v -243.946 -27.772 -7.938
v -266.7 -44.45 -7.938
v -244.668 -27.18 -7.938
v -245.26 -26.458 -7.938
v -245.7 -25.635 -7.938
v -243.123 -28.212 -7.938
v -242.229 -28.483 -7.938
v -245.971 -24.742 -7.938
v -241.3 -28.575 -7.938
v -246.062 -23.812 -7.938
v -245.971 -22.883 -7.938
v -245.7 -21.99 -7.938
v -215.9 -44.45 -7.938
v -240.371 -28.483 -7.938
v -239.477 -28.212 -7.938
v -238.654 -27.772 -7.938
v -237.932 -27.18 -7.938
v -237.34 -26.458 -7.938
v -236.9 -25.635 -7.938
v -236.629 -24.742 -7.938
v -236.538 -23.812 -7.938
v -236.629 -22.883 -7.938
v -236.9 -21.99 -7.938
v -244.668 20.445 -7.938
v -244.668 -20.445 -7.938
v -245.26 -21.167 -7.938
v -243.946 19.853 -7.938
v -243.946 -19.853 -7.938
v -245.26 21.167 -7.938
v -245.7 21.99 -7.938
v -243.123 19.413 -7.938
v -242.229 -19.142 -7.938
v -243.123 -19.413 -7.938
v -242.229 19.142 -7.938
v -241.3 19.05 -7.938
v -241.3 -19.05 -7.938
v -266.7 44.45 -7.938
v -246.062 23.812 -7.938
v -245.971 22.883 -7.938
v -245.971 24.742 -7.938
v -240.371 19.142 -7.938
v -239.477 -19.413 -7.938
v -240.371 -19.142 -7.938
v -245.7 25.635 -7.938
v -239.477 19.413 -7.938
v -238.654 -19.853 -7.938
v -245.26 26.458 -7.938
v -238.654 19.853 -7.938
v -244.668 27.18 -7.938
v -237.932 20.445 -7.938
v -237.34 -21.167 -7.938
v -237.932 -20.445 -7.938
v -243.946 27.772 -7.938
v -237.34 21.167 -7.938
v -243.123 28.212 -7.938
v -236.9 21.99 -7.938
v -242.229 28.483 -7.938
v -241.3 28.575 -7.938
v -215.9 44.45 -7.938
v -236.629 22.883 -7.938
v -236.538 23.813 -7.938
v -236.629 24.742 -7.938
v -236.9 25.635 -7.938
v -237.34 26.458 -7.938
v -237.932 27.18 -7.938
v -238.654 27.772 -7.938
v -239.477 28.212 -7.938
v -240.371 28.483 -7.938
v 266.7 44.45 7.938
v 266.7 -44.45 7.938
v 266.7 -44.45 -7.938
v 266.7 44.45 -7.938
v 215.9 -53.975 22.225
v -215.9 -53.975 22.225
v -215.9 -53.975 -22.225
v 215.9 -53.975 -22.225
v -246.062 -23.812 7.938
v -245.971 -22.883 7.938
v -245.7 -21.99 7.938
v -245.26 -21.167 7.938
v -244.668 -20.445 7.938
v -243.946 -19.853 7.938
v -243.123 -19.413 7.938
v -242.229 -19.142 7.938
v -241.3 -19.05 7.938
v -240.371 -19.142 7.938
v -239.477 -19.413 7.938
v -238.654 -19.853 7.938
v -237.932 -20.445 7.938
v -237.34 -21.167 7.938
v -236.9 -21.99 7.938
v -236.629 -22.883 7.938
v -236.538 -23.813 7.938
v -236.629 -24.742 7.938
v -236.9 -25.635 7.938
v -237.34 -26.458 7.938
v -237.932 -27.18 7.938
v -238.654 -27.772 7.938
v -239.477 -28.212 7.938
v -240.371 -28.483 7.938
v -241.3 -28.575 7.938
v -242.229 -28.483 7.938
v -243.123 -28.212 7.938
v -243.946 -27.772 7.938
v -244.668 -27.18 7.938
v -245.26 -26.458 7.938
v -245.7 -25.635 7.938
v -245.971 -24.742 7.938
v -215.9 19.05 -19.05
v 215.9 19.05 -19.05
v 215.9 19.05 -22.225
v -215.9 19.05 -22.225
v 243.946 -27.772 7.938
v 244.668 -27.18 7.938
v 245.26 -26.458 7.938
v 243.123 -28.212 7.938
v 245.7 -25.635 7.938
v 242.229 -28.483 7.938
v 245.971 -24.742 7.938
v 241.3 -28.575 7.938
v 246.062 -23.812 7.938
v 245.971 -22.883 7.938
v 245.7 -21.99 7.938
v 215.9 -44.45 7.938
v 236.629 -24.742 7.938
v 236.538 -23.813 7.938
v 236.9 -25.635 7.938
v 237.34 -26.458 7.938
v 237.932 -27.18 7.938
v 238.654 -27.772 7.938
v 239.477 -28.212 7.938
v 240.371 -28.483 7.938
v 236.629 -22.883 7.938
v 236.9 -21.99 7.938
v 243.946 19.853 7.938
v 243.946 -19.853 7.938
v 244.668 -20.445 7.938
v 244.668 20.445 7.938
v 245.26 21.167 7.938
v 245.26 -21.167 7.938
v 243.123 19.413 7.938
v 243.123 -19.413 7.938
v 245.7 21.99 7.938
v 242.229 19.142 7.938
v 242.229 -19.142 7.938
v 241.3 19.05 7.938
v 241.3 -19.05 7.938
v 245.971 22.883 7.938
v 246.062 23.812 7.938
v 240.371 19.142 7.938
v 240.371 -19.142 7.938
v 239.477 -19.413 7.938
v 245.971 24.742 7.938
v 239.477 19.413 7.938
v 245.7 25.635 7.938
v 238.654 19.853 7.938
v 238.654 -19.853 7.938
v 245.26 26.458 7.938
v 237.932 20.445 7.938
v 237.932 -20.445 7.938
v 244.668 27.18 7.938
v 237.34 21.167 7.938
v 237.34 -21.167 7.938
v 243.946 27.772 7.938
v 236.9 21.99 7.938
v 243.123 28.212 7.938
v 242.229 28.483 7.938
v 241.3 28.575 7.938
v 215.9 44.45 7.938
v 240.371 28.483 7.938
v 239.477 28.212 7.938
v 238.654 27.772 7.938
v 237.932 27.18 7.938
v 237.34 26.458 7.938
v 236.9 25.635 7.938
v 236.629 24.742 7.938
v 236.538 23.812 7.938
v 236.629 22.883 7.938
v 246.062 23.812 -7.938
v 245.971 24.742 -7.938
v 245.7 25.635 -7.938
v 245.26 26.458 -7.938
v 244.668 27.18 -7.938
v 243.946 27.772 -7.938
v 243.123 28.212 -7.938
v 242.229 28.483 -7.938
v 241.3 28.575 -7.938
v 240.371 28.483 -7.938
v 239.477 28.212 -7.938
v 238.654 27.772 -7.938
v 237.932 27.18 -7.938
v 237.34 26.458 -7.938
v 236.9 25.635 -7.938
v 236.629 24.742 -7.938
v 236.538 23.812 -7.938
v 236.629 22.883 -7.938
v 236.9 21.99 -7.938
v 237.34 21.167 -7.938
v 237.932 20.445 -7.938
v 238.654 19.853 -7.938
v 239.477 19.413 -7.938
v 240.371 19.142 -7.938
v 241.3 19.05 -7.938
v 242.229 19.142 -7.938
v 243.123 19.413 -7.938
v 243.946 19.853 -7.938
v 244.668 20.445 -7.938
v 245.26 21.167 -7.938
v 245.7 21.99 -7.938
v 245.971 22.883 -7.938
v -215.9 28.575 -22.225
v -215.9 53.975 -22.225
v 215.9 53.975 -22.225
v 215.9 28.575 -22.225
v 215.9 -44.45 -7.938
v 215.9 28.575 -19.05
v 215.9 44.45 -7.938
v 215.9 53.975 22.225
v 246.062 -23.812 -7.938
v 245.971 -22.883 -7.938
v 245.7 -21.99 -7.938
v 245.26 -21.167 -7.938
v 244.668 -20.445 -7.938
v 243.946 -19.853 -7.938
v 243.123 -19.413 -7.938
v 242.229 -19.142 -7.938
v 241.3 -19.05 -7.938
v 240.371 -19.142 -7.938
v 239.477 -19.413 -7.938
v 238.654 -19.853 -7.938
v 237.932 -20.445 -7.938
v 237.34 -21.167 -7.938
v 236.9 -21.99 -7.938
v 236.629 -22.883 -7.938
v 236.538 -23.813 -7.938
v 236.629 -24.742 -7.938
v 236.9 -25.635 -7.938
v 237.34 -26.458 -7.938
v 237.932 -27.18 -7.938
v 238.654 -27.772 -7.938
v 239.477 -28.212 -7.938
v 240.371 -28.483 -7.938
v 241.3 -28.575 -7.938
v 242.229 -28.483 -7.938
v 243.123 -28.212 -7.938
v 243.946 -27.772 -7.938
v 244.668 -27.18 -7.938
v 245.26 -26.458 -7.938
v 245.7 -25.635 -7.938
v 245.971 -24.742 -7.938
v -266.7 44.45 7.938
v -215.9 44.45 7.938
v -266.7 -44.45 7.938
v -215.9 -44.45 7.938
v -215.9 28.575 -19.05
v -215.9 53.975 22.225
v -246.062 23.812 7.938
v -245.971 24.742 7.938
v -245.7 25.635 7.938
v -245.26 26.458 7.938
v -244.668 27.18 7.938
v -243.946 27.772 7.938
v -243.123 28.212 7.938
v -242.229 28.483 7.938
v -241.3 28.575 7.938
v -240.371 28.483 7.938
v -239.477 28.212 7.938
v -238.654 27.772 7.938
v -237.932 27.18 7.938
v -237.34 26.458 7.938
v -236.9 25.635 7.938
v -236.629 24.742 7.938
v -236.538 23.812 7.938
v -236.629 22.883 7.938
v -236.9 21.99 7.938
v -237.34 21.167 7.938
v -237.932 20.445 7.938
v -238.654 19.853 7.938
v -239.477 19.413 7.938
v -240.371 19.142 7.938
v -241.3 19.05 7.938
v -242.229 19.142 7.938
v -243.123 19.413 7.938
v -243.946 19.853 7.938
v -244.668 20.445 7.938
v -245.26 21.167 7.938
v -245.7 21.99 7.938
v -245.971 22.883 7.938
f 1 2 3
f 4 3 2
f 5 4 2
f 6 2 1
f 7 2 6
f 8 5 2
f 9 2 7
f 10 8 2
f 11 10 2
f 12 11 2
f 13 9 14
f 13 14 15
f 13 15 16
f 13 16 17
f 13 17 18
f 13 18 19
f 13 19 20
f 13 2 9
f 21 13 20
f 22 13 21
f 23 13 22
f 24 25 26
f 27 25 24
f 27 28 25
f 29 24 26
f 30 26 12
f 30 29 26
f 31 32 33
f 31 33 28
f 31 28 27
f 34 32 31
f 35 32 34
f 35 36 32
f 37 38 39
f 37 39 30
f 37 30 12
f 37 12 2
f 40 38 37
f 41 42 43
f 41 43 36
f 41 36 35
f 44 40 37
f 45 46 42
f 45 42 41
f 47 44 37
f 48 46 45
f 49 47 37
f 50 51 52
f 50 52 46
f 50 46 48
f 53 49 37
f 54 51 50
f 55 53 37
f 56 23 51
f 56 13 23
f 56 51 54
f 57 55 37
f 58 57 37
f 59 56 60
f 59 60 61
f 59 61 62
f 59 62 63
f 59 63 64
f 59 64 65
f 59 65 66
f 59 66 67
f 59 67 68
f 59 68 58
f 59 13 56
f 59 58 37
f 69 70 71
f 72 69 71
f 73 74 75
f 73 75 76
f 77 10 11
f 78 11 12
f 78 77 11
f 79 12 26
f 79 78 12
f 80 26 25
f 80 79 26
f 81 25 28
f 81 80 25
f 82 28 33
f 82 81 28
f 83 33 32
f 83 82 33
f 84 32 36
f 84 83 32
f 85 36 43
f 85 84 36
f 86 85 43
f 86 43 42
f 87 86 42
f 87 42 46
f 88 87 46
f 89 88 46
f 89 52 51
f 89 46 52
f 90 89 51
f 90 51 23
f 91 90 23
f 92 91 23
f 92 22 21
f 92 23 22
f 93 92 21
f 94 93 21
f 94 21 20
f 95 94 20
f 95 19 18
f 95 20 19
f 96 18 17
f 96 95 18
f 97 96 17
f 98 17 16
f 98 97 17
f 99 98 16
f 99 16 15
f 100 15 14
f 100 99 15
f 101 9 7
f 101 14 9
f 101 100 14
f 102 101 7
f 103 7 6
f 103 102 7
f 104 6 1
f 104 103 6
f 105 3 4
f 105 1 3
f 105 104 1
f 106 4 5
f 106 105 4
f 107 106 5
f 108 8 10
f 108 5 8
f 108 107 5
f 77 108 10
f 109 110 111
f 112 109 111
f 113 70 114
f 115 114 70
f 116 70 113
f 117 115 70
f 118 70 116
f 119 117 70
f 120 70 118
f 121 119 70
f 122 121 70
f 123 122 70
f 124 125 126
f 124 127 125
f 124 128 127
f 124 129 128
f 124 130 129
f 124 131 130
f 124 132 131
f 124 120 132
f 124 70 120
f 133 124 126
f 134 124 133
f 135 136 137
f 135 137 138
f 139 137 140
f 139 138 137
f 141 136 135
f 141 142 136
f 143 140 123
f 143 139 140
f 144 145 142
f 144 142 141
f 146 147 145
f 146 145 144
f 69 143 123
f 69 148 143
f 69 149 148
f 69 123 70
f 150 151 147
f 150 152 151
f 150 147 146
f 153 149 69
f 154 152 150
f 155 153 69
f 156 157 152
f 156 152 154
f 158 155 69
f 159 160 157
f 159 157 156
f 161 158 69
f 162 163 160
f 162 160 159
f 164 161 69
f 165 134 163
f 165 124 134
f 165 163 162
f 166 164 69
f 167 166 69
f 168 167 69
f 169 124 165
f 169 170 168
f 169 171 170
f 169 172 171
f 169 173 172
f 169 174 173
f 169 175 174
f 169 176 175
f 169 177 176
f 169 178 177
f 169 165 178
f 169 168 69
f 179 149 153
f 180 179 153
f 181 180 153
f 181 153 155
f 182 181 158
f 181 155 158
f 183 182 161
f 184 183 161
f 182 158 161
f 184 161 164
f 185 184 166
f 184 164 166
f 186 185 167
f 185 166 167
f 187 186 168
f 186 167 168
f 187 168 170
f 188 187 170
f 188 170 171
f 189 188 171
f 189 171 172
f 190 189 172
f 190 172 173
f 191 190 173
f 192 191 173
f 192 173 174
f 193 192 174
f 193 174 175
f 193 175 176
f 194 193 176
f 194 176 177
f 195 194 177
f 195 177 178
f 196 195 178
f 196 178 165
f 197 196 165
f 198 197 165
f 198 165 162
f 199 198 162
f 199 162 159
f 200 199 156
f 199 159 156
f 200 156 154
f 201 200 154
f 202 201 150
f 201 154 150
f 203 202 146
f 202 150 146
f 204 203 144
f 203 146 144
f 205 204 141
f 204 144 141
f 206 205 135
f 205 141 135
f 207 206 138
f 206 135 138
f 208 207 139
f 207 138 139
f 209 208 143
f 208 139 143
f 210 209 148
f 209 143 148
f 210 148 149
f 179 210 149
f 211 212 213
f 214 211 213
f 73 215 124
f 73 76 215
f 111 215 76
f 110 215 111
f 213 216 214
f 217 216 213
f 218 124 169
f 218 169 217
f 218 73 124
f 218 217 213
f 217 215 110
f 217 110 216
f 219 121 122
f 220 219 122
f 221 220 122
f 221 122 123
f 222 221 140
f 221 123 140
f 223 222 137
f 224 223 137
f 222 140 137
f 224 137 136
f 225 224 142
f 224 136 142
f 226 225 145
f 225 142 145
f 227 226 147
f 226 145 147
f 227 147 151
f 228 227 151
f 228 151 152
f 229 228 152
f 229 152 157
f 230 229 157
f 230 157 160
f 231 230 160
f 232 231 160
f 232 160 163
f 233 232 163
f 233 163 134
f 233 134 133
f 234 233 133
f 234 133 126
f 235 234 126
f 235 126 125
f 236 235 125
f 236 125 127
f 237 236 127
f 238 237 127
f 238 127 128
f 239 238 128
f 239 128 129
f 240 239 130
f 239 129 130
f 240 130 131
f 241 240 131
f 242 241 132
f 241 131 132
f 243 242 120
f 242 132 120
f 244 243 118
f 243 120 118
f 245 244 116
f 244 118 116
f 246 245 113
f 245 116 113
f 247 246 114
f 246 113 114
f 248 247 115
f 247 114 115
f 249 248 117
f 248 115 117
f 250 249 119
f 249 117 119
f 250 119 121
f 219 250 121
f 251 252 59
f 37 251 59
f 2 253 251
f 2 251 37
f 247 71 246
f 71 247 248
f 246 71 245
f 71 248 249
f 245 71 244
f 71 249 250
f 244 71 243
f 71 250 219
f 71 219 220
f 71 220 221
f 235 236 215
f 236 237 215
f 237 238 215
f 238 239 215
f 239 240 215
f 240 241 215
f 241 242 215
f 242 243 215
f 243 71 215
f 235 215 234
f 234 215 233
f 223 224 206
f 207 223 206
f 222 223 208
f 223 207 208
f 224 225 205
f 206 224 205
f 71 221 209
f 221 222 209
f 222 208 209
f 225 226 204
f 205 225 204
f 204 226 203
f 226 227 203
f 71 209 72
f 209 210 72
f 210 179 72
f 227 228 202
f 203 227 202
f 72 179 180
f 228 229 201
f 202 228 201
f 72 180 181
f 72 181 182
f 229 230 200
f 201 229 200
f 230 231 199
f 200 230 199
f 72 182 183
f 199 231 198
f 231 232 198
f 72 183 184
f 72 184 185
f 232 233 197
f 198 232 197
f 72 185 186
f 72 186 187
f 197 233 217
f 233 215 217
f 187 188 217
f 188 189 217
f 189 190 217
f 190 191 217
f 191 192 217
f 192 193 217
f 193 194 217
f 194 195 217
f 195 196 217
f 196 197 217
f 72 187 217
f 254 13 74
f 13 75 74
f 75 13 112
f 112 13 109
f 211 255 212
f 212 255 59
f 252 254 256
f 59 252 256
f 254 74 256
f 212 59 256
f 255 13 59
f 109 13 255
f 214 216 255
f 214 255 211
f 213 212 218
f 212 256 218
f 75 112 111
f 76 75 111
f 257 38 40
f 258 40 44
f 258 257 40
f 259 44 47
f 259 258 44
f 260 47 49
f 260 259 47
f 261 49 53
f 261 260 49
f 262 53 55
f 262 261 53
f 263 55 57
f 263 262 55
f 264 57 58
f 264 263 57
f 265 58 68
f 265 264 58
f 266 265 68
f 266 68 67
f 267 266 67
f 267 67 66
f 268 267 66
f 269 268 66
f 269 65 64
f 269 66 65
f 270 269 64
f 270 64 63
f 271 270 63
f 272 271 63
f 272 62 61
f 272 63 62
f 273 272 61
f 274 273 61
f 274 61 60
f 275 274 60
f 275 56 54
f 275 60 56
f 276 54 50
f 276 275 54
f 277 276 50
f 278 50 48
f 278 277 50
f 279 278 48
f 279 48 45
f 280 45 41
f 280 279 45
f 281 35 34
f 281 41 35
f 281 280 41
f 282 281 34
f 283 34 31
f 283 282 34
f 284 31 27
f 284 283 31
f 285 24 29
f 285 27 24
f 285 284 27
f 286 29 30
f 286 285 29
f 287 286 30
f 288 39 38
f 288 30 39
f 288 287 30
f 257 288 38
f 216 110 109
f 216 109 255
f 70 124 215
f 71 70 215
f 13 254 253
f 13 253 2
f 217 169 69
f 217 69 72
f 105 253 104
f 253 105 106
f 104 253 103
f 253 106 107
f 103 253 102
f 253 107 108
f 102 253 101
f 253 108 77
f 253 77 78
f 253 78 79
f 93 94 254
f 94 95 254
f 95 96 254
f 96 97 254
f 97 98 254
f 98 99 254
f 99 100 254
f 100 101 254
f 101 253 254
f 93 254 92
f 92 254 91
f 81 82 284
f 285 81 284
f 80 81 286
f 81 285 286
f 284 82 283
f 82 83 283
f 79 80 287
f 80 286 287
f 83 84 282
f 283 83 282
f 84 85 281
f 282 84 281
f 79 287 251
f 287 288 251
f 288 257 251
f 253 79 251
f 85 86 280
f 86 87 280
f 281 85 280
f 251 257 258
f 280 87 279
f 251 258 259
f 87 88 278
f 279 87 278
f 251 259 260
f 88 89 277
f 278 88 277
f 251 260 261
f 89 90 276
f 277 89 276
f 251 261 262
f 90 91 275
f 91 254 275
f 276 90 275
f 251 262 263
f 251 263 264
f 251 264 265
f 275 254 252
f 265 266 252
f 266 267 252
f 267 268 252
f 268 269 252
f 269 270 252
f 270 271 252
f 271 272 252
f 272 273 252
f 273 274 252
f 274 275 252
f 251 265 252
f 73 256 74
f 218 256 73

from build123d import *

# Parameters (mm, degrees)
SKETCH1_W           = 431.8
SKETCH1_H           = 107.95
BOSS_EXTRUDE1_DEPTH = 22.225
SKETCH2_W           = 15.875
SKETCH2_H           = 88.9
BOSS_EXTRUDE2_DEPTH = 50.8
SKETCH3_R           = 4.7625
CUT_EXTRUDE1_DEPTH  = 274.773568905
SKETCH4_W           = 3.175
SKETCH4_H           = 9.525
CUT_EXTRUDE2_DEPTH  = 436.727542451


with BuildPart() as part:
    # Sketch1 → Boss-Extrude1 (new, symmetric)
    with BuildSketch(Plane.XY):
        Rectangle(SKETCH1_W, SKETCH1_H)
    extrude(amount=BOSS_EXTRUDE1_DEPTH, both=True)

    # Sketch2 → Boss-Extrude2 (add)
    with BuildSketch(Plane(origin=(215.9, 0, 0), x_dir=(0, 0, -1), z_dir=(1, 0, 0))):
        Rectangle(SKETCH2_W, SKETCH2_H)
    boss_extrude2 = extrude(amount=BOSS_EXTRUDE2_DEPTH)

    # Sketch3 → Cut-Extrude1 (cut, through all)
    with BuildSketch(Plane.XY.offset(7.9375)):
        with Locations((241.3, 23.8125)):
            Circle(SKETCH3_R)
        with Locations((241.3, -23.8125)):
            Circle(SKETCH3_R)
    cut_extrude1 = extrude(amount=-CUT_EXTRUDE1_DEPTH, mode=Mode.SUBTRACT)

    # Sketch4 → Cut-Extrude2 (cut, through all)
    with BuildSketch(Plane(origin=(215.9, 0, 0), x_dir=(0, 0, -1), z_dir=(1, 0, 0))):
        with Locations((20.6375, 23.8125)):
            Rectangle(SKETCH4_W, SKETCH4_H)
    extrude(amount=-CUT_EXTRUDE2_DEPTH, mode=Mode.SUBTRACT)

    # Mirror1: Boss-Extrude2, Cut-Extrude1 across plane
    add(boss_extrude2.mirror(Plane(origin=(0, 0, 0), x_dir=(0, 0, 1), z_dir=(1, 0, 0))))
    add(cut_extrude1.mirror(Plane(origin=(0, 0, 0), x_dir=(0, 0, 1), z_dir=(1, 0, 0))), mode=Mode.SUBTRACT)


solid = part.part
